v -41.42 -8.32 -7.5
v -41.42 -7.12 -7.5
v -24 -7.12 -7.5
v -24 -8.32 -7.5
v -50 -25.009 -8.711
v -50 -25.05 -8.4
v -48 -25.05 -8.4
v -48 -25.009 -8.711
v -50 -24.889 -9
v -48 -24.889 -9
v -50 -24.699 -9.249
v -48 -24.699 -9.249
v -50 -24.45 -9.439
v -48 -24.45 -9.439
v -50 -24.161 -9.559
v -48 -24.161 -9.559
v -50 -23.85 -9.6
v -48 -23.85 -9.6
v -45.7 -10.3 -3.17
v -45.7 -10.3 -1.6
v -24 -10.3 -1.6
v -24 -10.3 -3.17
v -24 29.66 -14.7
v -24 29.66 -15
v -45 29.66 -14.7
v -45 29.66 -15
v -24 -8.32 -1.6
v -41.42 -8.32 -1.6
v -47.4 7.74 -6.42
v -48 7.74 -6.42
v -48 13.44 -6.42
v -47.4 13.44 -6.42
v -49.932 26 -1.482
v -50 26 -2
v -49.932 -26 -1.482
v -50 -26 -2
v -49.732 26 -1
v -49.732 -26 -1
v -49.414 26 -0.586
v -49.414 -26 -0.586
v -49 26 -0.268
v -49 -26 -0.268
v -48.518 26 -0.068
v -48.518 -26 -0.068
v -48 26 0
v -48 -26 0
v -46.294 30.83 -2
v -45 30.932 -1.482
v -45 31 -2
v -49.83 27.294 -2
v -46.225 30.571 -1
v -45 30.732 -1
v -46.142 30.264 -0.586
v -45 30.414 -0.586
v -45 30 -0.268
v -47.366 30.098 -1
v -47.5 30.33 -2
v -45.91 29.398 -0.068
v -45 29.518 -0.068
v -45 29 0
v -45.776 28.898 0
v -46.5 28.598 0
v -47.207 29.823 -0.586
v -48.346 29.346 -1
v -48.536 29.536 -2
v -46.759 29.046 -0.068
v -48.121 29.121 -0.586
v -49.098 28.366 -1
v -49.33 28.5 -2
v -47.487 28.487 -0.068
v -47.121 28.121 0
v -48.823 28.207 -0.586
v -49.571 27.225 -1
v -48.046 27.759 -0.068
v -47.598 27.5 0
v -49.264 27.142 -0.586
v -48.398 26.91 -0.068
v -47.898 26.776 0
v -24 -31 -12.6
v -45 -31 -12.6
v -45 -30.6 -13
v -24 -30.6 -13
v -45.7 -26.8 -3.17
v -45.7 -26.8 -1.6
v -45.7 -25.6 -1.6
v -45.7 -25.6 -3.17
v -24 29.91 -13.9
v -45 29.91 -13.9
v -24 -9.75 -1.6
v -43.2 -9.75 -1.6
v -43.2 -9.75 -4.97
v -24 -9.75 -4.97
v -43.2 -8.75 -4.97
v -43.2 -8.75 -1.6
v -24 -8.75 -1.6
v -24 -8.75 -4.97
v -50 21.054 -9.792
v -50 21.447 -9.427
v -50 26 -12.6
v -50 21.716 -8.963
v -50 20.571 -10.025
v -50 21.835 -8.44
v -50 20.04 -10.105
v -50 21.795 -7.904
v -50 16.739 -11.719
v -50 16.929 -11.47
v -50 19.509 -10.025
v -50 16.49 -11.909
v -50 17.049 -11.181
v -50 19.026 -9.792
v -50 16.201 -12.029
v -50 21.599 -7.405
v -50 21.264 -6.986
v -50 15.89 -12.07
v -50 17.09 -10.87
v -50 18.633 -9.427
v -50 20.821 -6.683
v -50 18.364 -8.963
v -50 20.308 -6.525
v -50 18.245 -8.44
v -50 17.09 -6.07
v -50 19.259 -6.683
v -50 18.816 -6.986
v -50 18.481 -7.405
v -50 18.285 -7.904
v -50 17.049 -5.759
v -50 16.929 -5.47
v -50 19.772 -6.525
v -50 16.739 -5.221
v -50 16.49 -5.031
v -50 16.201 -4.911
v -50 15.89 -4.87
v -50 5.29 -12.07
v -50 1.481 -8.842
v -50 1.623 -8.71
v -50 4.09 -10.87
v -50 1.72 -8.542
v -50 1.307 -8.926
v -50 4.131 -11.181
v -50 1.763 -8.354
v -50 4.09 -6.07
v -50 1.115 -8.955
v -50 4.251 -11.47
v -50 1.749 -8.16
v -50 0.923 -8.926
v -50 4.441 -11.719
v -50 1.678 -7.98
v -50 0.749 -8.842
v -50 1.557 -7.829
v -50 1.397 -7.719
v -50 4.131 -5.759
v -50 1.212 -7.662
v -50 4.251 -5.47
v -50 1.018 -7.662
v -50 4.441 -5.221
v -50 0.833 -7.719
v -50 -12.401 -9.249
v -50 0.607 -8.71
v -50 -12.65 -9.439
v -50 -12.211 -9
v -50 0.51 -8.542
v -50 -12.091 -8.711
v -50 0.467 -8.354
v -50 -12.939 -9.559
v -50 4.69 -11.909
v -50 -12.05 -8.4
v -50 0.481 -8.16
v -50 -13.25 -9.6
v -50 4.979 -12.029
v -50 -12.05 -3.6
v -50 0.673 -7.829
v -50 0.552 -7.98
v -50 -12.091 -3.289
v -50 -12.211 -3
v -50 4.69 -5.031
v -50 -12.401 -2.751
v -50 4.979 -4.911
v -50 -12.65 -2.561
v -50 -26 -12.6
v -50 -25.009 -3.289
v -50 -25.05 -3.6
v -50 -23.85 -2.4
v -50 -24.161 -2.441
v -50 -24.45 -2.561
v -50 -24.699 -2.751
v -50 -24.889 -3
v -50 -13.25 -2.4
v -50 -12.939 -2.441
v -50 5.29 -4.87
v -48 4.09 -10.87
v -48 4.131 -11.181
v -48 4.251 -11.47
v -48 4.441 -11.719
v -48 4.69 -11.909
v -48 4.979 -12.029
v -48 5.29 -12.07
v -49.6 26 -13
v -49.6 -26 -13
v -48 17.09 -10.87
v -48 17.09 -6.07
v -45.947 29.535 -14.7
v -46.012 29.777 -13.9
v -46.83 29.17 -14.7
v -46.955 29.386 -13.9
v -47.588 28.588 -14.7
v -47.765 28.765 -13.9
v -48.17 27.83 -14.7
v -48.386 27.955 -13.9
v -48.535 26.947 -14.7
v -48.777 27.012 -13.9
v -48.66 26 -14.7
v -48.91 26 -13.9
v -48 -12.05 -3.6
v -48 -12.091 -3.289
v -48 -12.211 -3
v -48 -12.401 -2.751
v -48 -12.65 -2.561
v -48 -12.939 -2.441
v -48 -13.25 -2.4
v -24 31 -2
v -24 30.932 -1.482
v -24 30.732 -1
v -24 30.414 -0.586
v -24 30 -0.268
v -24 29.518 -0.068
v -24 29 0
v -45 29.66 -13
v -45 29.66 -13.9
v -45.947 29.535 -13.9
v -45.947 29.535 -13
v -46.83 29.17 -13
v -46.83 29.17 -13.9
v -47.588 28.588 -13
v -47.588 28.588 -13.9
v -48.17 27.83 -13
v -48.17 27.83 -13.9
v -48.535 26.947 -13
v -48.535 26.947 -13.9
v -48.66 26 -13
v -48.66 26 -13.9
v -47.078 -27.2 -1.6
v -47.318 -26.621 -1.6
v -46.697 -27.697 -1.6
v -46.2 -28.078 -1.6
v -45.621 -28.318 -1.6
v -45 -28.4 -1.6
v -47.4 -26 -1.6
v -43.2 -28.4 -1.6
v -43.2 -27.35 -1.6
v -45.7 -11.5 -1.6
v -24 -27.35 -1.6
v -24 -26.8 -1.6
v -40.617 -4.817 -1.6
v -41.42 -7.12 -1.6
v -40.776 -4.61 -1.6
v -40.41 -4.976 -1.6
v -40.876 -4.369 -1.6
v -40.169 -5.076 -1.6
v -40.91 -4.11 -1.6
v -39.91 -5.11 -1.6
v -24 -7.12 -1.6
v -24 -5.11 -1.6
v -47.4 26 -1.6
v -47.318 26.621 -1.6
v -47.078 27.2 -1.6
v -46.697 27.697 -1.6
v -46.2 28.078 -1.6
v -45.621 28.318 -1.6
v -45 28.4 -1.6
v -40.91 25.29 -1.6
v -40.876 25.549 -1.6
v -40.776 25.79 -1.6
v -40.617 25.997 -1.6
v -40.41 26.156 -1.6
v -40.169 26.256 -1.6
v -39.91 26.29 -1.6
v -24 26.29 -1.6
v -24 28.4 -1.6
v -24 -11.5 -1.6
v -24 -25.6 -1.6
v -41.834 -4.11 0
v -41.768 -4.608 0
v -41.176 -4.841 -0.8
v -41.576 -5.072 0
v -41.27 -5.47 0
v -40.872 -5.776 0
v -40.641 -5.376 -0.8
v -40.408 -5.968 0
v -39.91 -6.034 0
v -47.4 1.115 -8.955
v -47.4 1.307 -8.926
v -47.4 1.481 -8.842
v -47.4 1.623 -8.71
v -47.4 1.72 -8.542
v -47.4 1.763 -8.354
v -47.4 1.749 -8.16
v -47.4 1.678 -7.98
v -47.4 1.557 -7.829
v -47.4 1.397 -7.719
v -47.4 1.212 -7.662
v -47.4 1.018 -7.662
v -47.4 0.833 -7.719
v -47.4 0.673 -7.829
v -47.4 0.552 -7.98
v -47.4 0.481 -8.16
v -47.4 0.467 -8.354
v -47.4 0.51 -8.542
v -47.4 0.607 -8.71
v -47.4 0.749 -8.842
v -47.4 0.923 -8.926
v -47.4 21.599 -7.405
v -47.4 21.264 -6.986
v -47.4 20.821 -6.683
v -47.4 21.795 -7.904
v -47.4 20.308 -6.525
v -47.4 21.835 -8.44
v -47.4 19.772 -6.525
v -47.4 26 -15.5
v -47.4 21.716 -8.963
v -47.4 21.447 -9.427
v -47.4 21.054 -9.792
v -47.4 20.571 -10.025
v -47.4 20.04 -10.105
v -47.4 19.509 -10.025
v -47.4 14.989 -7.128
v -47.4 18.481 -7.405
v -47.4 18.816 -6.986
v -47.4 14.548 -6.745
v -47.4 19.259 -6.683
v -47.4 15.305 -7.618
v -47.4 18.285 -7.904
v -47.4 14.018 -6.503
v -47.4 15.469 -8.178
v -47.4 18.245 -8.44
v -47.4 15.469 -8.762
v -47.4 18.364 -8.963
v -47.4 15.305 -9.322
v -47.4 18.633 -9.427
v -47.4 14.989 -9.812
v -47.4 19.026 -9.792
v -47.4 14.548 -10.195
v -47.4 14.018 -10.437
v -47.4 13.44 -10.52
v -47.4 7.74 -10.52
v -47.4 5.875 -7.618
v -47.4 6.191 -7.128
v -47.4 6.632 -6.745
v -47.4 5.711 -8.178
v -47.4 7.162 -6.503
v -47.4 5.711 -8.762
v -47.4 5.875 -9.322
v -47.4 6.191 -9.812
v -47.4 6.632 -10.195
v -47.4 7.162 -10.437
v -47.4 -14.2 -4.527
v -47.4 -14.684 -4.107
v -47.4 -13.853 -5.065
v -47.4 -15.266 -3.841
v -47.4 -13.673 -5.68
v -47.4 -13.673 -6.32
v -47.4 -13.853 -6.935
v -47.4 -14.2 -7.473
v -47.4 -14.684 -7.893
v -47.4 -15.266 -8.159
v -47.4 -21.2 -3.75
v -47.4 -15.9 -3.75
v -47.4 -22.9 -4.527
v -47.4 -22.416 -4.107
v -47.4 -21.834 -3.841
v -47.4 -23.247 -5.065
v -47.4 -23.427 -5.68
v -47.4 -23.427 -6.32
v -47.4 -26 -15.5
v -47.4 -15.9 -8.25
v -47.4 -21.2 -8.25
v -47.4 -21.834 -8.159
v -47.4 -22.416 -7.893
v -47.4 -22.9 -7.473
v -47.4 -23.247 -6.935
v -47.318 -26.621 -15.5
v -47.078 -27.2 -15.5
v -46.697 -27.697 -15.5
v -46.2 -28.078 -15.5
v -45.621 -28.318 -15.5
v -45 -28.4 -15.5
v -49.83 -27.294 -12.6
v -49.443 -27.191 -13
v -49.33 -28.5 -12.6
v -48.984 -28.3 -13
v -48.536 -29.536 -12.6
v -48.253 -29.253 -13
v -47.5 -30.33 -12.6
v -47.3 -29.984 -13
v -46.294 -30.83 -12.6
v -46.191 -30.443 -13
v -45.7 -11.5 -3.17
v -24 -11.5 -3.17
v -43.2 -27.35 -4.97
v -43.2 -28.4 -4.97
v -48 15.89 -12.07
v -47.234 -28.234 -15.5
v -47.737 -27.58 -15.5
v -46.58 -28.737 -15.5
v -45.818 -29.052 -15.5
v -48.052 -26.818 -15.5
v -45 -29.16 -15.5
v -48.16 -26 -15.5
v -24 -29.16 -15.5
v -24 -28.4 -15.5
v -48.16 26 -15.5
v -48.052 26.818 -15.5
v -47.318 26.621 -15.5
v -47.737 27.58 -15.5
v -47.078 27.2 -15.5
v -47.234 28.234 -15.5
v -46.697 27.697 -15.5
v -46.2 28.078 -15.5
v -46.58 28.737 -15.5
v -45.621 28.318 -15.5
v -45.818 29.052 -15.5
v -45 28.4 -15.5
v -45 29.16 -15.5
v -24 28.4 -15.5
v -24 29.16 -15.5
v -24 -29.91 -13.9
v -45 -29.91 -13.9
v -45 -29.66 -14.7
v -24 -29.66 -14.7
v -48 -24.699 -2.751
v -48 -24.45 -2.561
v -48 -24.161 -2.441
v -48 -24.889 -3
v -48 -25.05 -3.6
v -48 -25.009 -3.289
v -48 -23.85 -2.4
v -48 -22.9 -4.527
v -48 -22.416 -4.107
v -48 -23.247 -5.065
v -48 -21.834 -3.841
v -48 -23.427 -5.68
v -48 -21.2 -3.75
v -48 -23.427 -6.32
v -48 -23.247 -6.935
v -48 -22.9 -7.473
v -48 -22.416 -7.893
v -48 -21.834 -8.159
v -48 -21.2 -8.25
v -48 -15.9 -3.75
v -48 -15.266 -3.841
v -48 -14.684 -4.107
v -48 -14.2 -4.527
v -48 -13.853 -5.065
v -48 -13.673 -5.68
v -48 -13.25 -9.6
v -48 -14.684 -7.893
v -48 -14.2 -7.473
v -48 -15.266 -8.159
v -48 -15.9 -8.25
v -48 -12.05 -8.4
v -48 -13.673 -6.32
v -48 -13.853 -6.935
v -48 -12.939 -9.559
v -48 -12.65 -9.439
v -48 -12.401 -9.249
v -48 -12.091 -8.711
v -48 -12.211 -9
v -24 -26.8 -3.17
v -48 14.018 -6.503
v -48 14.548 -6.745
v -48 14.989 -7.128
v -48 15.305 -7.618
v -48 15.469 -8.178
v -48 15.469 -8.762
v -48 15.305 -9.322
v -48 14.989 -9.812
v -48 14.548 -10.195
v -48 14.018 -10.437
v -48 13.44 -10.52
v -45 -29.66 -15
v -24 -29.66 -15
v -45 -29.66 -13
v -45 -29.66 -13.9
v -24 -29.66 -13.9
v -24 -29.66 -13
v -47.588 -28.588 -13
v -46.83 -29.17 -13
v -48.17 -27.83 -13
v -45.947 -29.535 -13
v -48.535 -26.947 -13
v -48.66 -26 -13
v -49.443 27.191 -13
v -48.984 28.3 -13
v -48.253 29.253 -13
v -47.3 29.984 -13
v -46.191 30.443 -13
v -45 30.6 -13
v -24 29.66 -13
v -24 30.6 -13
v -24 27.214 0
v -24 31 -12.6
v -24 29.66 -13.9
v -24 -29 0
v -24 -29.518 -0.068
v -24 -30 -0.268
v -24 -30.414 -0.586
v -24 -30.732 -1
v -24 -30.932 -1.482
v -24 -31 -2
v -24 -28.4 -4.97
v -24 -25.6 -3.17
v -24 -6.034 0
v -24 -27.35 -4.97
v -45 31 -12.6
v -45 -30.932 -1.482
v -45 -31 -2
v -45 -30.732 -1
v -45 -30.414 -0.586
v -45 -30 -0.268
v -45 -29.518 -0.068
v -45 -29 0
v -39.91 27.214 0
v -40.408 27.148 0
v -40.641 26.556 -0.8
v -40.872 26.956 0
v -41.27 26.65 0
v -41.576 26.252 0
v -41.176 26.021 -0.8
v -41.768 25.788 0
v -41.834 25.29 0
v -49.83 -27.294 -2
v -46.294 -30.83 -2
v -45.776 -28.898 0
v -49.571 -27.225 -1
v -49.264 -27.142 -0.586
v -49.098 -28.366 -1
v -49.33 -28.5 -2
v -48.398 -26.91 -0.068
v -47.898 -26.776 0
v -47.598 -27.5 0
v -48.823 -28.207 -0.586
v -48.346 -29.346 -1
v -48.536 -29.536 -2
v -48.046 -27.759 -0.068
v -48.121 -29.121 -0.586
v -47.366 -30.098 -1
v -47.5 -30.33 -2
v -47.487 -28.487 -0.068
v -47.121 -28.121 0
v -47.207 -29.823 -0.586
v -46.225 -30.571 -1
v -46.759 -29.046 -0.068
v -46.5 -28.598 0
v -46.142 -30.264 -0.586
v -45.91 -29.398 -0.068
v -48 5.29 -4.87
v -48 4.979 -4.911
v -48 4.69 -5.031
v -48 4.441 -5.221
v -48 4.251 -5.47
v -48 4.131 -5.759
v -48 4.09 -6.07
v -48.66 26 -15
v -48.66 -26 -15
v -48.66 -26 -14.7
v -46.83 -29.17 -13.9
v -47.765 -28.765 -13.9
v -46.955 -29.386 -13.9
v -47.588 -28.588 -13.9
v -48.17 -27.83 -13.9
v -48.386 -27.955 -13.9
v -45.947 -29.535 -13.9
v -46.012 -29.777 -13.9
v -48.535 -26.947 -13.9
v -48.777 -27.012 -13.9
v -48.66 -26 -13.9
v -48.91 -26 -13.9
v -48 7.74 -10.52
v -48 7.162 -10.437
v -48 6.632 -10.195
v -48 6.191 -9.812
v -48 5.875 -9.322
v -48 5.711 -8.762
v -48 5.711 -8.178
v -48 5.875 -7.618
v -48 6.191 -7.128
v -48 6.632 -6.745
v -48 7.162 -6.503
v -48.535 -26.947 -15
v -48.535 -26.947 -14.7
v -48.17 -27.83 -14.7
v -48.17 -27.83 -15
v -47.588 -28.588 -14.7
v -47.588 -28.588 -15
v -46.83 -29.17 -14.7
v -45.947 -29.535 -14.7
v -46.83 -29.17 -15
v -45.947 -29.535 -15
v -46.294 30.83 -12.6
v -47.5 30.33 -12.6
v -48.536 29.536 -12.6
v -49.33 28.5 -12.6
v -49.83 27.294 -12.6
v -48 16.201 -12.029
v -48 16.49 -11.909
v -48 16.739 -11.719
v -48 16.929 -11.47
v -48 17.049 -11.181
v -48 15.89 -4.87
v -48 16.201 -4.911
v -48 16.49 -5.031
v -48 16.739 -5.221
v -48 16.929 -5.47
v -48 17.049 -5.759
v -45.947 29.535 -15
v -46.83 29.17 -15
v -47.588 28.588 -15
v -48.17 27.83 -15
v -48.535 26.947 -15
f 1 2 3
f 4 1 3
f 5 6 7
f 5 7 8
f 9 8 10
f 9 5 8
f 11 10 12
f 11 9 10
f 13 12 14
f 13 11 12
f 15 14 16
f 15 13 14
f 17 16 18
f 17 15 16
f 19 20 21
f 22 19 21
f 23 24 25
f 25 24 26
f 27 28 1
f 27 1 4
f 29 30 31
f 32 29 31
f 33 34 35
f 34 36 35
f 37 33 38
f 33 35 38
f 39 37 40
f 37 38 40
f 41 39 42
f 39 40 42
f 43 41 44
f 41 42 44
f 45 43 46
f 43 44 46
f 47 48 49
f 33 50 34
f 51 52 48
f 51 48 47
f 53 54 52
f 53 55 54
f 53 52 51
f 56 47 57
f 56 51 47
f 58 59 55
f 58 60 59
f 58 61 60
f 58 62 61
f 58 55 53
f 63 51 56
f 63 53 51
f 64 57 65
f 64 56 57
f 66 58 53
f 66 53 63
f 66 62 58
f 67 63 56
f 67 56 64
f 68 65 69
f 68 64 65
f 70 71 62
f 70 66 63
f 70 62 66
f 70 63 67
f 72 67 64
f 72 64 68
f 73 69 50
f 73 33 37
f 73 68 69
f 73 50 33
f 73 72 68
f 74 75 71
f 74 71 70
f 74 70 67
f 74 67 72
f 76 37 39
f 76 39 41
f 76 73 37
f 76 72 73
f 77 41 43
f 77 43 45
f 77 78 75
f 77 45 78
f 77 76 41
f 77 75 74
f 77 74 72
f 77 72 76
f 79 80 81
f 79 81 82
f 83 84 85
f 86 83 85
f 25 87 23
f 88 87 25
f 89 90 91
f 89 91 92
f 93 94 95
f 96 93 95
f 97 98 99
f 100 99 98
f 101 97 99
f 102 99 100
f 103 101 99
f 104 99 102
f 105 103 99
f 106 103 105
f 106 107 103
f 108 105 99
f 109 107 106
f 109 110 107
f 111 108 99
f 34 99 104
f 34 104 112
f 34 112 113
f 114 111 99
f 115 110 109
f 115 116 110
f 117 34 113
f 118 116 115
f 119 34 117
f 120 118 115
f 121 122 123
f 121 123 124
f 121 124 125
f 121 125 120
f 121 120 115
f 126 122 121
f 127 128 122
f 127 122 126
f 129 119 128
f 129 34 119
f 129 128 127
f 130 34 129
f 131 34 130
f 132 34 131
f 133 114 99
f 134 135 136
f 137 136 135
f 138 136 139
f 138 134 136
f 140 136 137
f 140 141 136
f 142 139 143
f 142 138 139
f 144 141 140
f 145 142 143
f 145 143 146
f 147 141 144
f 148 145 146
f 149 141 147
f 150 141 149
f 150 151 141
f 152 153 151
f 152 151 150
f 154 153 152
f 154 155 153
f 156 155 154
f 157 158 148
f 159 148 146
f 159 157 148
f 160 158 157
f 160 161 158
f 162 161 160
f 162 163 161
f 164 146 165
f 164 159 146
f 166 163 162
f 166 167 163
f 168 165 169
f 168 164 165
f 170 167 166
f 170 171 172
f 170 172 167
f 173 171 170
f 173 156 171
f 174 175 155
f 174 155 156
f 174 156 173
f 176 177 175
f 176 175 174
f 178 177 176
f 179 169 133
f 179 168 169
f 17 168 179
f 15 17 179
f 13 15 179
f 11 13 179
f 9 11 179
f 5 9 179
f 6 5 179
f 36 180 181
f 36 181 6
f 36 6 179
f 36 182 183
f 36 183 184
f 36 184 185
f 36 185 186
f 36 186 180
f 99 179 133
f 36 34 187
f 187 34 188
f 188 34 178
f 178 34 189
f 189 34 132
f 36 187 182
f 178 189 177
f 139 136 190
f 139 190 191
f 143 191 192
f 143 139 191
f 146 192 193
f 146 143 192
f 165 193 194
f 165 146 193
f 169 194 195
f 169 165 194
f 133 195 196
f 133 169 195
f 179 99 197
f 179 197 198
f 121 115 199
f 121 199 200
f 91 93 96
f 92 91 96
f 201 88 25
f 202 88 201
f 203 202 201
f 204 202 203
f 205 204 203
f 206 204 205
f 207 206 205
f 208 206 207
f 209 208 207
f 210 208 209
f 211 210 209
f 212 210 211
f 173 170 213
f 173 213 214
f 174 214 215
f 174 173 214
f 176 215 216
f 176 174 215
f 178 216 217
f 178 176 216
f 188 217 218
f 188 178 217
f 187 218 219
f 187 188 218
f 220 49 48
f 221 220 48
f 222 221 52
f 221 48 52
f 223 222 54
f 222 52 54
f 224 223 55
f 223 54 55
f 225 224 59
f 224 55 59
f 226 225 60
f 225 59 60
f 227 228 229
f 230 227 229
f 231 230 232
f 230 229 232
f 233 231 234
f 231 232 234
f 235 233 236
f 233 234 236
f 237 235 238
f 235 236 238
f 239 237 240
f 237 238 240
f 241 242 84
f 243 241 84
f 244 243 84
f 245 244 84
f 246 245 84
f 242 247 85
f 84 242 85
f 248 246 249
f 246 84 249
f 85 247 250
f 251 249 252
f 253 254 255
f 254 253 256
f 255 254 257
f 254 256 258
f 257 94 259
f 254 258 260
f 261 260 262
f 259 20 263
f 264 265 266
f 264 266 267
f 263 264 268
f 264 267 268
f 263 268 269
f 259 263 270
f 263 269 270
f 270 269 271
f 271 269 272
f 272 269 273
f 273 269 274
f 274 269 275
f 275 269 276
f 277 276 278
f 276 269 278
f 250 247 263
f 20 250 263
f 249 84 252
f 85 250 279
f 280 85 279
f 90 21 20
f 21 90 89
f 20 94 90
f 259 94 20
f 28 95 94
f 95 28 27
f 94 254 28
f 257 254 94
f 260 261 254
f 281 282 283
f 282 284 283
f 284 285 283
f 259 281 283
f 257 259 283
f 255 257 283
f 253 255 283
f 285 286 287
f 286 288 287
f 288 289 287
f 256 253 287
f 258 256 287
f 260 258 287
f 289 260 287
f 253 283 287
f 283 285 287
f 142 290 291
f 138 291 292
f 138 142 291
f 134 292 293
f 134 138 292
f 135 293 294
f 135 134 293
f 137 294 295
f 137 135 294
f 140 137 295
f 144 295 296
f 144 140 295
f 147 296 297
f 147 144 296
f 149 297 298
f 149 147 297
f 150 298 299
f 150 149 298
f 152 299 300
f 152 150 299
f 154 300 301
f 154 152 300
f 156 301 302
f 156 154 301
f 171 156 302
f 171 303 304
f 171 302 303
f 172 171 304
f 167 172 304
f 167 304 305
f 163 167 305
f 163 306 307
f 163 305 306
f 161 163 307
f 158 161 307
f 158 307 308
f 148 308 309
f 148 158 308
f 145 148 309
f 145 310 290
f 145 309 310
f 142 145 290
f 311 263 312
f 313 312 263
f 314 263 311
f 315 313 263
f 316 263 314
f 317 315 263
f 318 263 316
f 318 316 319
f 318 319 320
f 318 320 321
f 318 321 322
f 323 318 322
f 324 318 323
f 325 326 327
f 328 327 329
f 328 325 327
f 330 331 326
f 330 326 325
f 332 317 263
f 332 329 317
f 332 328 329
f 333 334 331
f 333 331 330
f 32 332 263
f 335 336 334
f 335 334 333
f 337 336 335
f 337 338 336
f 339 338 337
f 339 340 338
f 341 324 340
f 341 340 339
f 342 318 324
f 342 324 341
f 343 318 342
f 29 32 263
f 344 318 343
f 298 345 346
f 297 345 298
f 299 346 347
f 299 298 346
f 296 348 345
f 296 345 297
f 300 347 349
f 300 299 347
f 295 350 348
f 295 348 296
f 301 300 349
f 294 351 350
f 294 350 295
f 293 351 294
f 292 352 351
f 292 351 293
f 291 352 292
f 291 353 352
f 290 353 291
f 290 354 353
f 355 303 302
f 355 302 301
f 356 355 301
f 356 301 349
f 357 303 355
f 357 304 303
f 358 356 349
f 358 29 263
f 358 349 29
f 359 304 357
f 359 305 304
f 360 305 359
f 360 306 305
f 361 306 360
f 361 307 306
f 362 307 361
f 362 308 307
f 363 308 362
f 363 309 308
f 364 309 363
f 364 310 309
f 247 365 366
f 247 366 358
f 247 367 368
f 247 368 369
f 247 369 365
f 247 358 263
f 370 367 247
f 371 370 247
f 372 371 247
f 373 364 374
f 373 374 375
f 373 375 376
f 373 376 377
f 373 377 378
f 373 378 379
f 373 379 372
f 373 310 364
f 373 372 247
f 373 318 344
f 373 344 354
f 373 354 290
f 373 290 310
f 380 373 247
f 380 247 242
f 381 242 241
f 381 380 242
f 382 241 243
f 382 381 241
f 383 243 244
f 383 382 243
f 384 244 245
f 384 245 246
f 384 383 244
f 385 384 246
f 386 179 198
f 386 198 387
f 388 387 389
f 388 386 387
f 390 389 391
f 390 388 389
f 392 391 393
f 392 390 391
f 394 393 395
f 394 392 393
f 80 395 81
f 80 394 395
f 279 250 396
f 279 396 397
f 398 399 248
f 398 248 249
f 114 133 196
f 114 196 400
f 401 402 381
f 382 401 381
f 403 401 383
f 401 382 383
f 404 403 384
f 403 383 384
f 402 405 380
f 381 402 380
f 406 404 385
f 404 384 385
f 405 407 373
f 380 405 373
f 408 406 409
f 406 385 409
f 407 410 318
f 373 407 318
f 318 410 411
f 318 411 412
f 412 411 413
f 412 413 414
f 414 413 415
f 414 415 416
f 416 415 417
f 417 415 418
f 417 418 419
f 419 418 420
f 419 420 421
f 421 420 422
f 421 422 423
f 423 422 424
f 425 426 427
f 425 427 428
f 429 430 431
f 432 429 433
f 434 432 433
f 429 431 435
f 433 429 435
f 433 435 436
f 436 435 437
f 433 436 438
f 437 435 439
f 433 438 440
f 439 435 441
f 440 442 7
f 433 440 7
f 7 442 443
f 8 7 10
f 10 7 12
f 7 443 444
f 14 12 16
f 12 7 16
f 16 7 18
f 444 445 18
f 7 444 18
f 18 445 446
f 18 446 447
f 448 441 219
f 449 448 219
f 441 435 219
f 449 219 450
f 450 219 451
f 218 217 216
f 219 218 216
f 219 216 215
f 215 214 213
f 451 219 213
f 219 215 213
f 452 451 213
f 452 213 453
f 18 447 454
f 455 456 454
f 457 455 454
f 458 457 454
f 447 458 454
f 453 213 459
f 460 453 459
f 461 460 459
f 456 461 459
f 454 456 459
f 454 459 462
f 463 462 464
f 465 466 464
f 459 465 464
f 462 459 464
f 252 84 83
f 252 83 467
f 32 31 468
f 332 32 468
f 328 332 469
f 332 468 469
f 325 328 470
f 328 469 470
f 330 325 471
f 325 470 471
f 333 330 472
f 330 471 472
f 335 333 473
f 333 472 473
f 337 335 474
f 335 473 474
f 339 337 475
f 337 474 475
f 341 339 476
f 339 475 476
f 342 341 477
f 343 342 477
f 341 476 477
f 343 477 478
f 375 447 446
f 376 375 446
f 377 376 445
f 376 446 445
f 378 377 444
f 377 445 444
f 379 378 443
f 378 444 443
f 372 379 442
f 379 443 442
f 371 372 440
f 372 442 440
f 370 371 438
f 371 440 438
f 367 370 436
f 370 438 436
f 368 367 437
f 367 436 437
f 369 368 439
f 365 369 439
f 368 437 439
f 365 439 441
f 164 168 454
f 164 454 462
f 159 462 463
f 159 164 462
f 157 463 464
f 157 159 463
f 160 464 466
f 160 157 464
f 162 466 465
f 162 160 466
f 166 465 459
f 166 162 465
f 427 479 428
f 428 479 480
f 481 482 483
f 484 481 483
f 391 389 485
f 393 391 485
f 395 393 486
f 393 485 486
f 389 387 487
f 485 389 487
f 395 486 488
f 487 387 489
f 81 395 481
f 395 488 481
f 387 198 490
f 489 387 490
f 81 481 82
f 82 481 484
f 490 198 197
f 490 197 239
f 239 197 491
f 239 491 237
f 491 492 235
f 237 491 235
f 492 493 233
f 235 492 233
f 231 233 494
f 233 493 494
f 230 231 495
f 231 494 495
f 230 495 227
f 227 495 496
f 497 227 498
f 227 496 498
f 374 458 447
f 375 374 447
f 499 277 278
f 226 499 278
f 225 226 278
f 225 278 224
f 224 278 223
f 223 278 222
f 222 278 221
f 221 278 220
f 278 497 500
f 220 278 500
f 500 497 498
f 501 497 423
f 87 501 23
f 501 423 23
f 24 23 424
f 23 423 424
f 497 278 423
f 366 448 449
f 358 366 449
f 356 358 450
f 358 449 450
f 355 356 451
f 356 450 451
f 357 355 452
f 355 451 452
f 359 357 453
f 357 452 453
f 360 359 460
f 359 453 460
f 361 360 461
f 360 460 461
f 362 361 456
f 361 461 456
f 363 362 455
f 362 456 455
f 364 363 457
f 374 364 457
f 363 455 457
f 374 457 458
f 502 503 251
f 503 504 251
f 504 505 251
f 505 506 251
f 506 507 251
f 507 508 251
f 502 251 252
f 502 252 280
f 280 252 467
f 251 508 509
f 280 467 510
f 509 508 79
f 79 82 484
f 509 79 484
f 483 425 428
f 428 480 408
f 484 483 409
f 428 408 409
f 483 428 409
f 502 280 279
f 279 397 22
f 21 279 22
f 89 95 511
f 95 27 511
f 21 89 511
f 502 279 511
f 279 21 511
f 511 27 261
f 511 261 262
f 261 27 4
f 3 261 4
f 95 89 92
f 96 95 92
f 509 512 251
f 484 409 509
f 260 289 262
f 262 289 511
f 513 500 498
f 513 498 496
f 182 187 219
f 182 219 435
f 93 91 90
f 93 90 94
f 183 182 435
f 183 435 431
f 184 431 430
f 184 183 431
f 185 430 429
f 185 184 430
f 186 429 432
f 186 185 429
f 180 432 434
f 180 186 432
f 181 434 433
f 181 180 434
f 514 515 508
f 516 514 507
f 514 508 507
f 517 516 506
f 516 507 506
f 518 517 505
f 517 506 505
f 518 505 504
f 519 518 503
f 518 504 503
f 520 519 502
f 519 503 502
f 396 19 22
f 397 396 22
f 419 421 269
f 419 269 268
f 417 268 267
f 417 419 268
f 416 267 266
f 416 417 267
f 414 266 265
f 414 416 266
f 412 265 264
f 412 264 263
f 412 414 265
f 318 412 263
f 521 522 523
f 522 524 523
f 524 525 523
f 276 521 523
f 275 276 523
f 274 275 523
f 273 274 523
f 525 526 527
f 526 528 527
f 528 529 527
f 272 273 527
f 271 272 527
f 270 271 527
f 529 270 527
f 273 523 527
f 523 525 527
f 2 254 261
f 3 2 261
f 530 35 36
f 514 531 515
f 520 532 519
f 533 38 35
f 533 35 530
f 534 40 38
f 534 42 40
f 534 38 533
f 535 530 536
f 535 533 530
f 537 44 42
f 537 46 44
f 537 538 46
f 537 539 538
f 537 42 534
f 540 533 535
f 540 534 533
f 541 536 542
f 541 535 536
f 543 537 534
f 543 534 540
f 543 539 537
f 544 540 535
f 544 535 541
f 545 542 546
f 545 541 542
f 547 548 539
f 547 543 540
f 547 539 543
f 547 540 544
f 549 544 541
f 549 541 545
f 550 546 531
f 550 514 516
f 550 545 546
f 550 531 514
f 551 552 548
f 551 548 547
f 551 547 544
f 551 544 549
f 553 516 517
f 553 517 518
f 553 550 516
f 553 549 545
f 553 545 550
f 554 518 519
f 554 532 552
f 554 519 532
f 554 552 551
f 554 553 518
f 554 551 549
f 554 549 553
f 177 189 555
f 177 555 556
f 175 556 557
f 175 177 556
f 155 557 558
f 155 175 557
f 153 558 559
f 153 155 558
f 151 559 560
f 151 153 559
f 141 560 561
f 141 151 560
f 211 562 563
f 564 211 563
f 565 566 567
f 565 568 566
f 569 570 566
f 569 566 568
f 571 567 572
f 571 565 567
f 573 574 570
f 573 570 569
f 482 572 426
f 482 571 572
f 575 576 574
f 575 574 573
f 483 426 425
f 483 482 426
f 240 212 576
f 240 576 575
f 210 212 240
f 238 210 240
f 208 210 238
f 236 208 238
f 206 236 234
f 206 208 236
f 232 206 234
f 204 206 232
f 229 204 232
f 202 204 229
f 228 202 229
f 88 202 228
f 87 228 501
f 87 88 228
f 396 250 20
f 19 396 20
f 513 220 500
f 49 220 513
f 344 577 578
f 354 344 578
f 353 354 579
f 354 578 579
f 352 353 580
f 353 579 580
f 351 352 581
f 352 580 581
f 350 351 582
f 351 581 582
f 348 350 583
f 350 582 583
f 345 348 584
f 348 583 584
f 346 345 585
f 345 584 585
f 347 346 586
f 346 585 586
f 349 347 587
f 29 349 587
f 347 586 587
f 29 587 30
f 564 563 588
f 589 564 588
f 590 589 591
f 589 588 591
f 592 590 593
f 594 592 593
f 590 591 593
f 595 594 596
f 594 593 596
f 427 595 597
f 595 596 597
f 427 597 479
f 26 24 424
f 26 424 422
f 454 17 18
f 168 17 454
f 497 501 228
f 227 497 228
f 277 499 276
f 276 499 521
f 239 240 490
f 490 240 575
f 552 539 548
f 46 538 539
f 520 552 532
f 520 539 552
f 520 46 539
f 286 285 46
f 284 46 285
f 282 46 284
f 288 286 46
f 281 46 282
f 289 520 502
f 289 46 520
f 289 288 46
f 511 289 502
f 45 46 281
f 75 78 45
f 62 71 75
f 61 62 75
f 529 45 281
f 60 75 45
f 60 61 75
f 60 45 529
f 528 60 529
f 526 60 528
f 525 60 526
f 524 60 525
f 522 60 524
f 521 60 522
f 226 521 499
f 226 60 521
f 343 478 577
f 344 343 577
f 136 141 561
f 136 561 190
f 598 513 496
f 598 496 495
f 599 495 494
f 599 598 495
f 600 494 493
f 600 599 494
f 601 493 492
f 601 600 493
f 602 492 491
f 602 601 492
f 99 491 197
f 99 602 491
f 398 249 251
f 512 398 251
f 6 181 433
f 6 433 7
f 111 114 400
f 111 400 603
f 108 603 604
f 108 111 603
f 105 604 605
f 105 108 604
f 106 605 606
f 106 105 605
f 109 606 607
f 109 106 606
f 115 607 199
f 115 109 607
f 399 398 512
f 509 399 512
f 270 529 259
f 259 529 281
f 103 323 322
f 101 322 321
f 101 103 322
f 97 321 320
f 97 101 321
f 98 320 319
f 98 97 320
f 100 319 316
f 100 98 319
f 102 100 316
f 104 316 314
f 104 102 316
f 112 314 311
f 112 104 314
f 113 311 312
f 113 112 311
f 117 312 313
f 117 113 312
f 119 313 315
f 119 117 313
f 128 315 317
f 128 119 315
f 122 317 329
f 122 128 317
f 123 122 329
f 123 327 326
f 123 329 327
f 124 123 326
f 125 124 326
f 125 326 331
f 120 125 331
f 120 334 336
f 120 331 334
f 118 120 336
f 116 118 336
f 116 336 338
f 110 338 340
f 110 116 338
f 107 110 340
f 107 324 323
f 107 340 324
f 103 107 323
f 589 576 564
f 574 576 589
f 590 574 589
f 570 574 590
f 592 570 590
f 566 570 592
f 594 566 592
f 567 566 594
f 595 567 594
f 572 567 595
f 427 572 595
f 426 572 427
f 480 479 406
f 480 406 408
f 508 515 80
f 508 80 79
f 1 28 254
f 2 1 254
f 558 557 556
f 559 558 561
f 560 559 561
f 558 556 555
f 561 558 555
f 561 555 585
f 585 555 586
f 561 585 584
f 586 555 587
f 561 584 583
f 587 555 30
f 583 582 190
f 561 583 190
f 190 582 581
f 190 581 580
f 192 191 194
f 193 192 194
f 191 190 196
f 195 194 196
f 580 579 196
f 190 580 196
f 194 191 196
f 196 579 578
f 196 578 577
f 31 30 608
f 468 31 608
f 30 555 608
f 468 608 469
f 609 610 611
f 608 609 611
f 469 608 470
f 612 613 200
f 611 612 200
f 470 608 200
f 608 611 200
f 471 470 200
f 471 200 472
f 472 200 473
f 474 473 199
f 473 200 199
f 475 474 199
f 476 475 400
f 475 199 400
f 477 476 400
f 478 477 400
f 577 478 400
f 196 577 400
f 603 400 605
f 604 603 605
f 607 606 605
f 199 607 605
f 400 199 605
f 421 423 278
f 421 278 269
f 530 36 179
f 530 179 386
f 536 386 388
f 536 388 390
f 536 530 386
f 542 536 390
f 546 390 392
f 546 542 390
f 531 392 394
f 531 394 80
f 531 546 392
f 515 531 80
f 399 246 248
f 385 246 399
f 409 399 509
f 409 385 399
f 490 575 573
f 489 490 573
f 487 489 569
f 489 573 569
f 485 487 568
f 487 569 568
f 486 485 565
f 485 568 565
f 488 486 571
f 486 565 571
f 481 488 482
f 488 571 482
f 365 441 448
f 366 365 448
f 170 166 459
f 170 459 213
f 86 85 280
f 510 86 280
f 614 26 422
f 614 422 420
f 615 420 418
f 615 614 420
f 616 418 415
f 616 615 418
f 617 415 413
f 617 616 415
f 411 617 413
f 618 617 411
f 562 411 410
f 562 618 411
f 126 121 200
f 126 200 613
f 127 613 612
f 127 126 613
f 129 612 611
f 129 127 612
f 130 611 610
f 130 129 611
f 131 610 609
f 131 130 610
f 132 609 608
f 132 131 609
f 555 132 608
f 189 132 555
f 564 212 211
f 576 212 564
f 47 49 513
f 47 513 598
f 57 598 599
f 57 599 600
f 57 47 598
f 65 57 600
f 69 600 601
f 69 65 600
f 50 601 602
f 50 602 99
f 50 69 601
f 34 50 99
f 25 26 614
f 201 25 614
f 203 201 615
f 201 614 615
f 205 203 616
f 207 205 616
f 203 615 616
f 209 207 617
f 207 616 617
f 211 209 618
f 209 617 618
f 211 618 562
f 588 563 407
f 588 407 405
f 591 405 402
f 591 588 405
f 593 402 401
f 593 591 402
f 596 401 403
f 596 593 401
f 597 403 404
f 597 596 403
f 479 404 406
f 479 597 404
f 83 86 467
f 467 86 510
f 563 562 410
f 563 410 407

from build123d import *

# Parameters (mm, degrees)
BODY_DEPTH              = 13
ROUND_FRONT_R           = 2
CAVITY_DEPTH            = 11.4
LIP_START               = -2.5
LIP_DEPTH               = 2.5
LIP_CHAMFER_SIZE        = 0.5
BEAD_DEPTH              = 0.8
BEAD_DRAFT              = -17.354024636
SCREEN_WINDOW_DEPTH     = 1.9
SCREEN_WINDOW_DRAFT     = -30
BOARD_FENCE_SK6_W       = 1.2
BOARD_FENCE_SK6_H       = 31.02
BOARD_FENCE_SK6_W_2     = 42.22
BOARD_FENCE_SK6_H_2     = 1.2
BOARD_FENCE_DEPTH       = 5.9
TP_RAILS_SK7_W          = 25
TP_RAILS_SK7_H          = 1.2
TP_RAILS_DEPTH          = 1.57
TP_FENCE_SK8_W          = 24
TP_FENCE_SK8_H          = 1
TP_FENCE_SK8_W_2        = 1
TP_FENCE_SK8_H_2        = 15.3
TP_FENCE_SK8_H_3        = 1.05
TP_FENCE_DEPTH          = 3.37
CELL_RIBS_SK9_W         = 1.2
CELL_RIBS_SK9_H         = 12
CELL_RIBS_DEPTH         = 9.05
MAX_RELIEF_DEPTH        = 0.9
MAX_WINDOW_DEPTH        = 1.8
MAX_WINDOW_CHAMFER_SIZE = 1
MAX_LEDGES_SK12_W       = 1.6
MAX_LEDGES_SK12_H       = 1.6
MAX_LEDGES_DEPTH        = 1.3
MAX_FENCE_DEPTH         = 2.6
USB_RECESS_DEPTH        = 2
LEFT_PORTS_SK15_R       = 1.8
LEFT_PORTS_SK15_R_2     = 0.65
LEFT_PORTS_DEPTH        = 3.2
BUZZER_KEEPER_SK16_W    = 1.2
BUZZER_KEEPER_SK16_H    = 8
BUZZER_KEEPER_DEPTH     = 14.8
MIC_KEEPER_SK17_W       = 6
MIC_KEEPER_SK17_H       = 1.2
MIC_KEEPER_DEPTH        = 13.5
SEAM_SHADOW_SIZE        = 0.4
PRY_NOTCH_SK18_W        = 8
PRY_NOTCH_SK18_H        = 1.8
PRY_NOTCH_DEPTH         = 1.2
FITTEST_TRIM_DEPTH      = 62.073398464
FITTEST_TRIM_DEPTH_BACK = 62.073398464
FITTEST_SK_W            = 120
FITTEST_SK_H            = 120


with BuildPart() as part:
    # Body_Sk1 → Body (new body)
    with BuildSketch(Plane.XY):
        with BuildLine():
            Line((-45, -31), (45, -31))
            ThreePointArc((45, -31), (48.535533906, -29.535533906), (50, -26))
            Line((50, -26), (50, 26))
            ThreePointArc((50, 26), (48.535533906, 29.535533906), (45, 31))
            Line((45, 31), (-45, 31))
            ThreePointArc((-45, 31), (-48.535533906, 29.535533906), (-50, 26))
            Line((-50, 26), (-50, -26))
            ThreePointArc((-50, -26), (-48.535533906, -29.535533906), (-45, -31))
        make_face()
    extrude(amount=-BODY_DEPTH)

    # Round_Front
    round_front_edges = [part.edges().sort_by_distance(p)[0] for p in [
        (50, 0, 0),
        (48.535533906, -29.535533906, 0),
        (0, -31, 0),
        (-48.535533906, -29.535533906, 0),
        (-50, 0, 0),
        (-48.535533906, 29.535533906, 0),
        (0, 31, 0),
        (48.535533906, 29.535533906, 0),
    ]]
    fillet(round_front_edges, radius=ROUND_FRONT_R)

    # Cavity_Sk2 → Cavity (cut)
    with BuildSketch(Plane.XY.offset(-13)):
        with BuildLine():
            Line((-45, -28.4), (45, -28.4))
            ThreePointArc((45, -28.4), (46.697056275, -27.697056275), (47.4, -26))
            Line((47.4, -26), (47.4, 26))
            ThreePointArc((47.4, 26), (46.697056275, 27.697056275), (45, 28.4))
            Line((45, 28.4), (-45, 28.4))
            ThreePointArc((-45, 28.4), (-46.697056275, 27.697056275), (-47.4, 26))
            Line((-47.4, 26), (-47.4, -26))
            ThreePointArc((-47.4, -26), (-46.697056275, -27.697056275), (-45, -28.4))
        make_face()
    extrude(amount=CAVITY_DEPTH, mode=Mode.SUBTRACT)

    # Lip_Sk3 → Lip (add)
    with BuildSketch(Plane.XY.offset(-13).offset(LIP_START)):
        with BuildLine():
            Line((-45, -29.66), (45, -29.66))
            ThreePointArc((45, -29.66), (47.588010819, -28.588010819), (48.66, -26))
            Line((48.66, -26), (48.66, 26))
            ThreePointArc((48.66, 26), (47.588010819, 28.588010819), (45, 29.66))
            Line((45, 29.66), (-45, 29.66))
            ThreePointArc((-45, 29.66), (-47.588010819, 28.588010819), (-48.66, 26))
            Line((-48.66, 26), (-48.66, -26))
            ThreePointArc((-48.66, -26), (-47.588010819, -28.588010819), (-45, -29.66))
        make_face()
        with BuildLine():
            Line((-45, -28.4), (45, -28.4))
            ThreePointArc((45, -28.4), (46.697056275, -27.697056275), (47.4, -26))
            Line((47.4, -26), (47.4, 26))
            ThreePointArc((47.4, 26), (46.697056275, 27.697056275), (45, 28.4))
            Line((45, 28.4), (-45, 28.4))
            ThreePointArc((-45, 28.4), (-46.697056275, 27.697056275), (-47.4, 26))
            Line((-47.4, 26), (-47.4, -26))
            ThreePointArc((-47.4, -26), (-46.697056275, -27.697056275), (-45, -28.4))
        make_face(mode=Mode.SUBTRACT)
    extrude(amount=LIP_DEPTH)

    # Lip_Chamfer
    lip_chamfer_edges = [part.edges().sort_by_distance(p)[0] for p in [
        (-47.588010819, -28.588010819, -15.5),
        (-48.66, 0, -15.5),
        (-47.588010819, 28.588010819, -15.5),
        (0, 29.66, -15.5),
        (47.588010819, 28.588010819, -15.5),
        (48.66, 0, -15.5),
        (47.588010819, -28.588010819, -15.5),
        (0, -29.66, -15.5),
    ]]
    chamfer(lip_chamfer_edges, length=LIP_CHAMFER_SIZE)


with BuildPart() as bead_tool:
    # Bead_Sk4 → Bead (with draft: the straight prism first)
    with BuildSketch(Plane.XY.offset(-13.9)):
        with BuildLine():
            Line((-45, -29.91), (45, -29.91))
            ThreePointArc((45, -29.91), (47.764787514, -28.764787514), (48.91, -26))
            Line((48.91, -26), (48.91, 26))
            ThreePointArc((48.91, 26), (47.764787514, 28.764787514), (45, 29.91))
            Line((45, 29.91), (-45, 29.91))
            ThreePointArc((-45, 29.91), (-47.764787514, 28.764787514), (-48.91, 26))
            Line((-48.91, 26), (-48.91, -26))
            ThreePointArc((-48.91, -26), (-47.764787514, -28.764787514), (-45, -29.91))
        make_face()
        with BuildLine():
            Line((-45, -29.06), (45, -29.06))
            ThreePointArc((45, -29.06), (47.16374675, -28.16374675), (48.06, -26))
            Line((48.06, -26), (48.06, 26))
            ThreePointArc((48.06, 26), (47.16374675, 28.16374675), (45, 29.06))
            Line((45, 29.06), (-45, 29.06))
            ThreePointArc((-45, 29.06), (-47.16374675, 28.16374675), (-48.06, 26))
            Line((-48.06, 26), (-48.06, -26))
            ThreePointArc((-48.06, -26), (-47.16374675, -28.16374675), (-45, -29.06))
        make_face(mode=Mode.SUBTRACT)
    extrude(amount=-BEAD_DEPTH)
    # Bead: the draft: its side faces are tilted about the plane it starts from
    bead_sides = [bead_tool.faces().sort_by_distance(p)[0] for p in [
        (0, -29.91, -14.3),
        (47.764787514, -28.764787514, -14.3),
        (48.91, 0, -14.3),
        (47.764787514, 28.764787514, -14.3),
        (0, 29.91, -14.3),
        (-47.764787514, 28.764787514, -14.3),
        (-48.91, 0, -14.3),
        (-47.764787514, -28.764787514, -14.3),
        (-47.16374675, -28.16374675, -14.3),
        (-48.06, 0, -14.3),
        (-47.16374675, 28.16374675, -14.3),
        (0, 29.06, -14.3),
        (47.16374675, 28.16374675, -14.3),
        (48.06, 0, -14.3),
        (47.16374675, -28.16374675, -14.3),
        (0, -29.06, -14.3),
    ]]
    draft(bead_sides, Plane.XY.offset(-13.9), BEAD_DRAFT)


with BuildPart() as part_1:
    add(part.part)

    # Bead: add bead_tool
    add(bead_tool.part)


with BuildPart() as screen_window_tool:
    # Screen_Window_Sk5 → Screen_Window (with draft: the straight prism first)
    with BuildSketch(Plane.XY):
        with BuildLine():
            Line((-39.91, -6.033760431), (-0.31, -6.033760431))
            ThreePointArc((-0.31, -6.033760431), (1.050304046, -5.470304046), (1.613760431, -4.11))
            Line((1.613760431, -4.11), (1.613760431, 25.29))
            ThreePointArc((1.613760431, 25.29), (1.050304046, 26.650304046), (-0.31, 27.213760431))
            Line((-0.31, 27.213760431), (-39.91, 27.213760431))
            ThreePointArc((-39.91, 27.213760431), (-41.270304046, 26.650304046), (-41.833760431, 25.29))
            Line((-41.833760431, 25.29), (-41.833760431, -4.11))
            ThreePointArc((-41.833760431, -4.11), (-41.270304046, -5.470304046), (-39.91, -6.033760431))
        make_face()
    extrude(amount=-SCREEN_WINDOW_DEPTH)
    # Screen_Window: the draft: its side faces are tilted about the plane it starts from
    screen_window_sides = [screen_window_tool.faces().sort_by_distance(p)[0] for p in [
        (-20.11, -6.033760431, -0.95),
        (1.050304046, -5.470304046, -0.95),
        (1.613760431, 10.59, -0.95),
        (1.050304046, 26.650304046, -0.95),
        (-20.11, 27.213760431, -0.95),
        (-41.270304046, 26.650304046, -0.95),
        (-41.833760431, 10.59, -0.95),
        (-41.270304046, -5.470304046, -0.95),
    ]]
    draft(screen_window_sides, Plane.XY, SCREEN_WINDOW_DRAFT)


with BuildPart() as part_2:
    add(part_1.part)

    # Screen_Window: cut by screen_window_tool
    add(screen_window_tool.part, mode=Mode.SUBTRACT)

    # Board_Fence_Sk6 → Board_Fence (add)
    with BuildSketch(Plane.XY.offset(-1.6)):
        with Locations((3.1, 11.59)):
            Rectangle(BOARD_FENCE_SK6_W, BOARD_FENCE_SK6_H)
        with Locations((-20.31, -7.72)):
            Rectangle(BOARD_FENCE_SK6_W_2, BOARD_FENCE_SK6_H_2)
    extrude(amount=-BOARD_FENCE_DEPTH)

    # TP_Rails_Sk7 → TP_Rails (add)
    with BuildSketch(Plane.XY.offset(-1.6)):
        with Locations((-33.2, -26.2)):
            Rectangle(TP_RAILS_SK7_W, TP_RAILS_SK7_H)
        with Locations((-33.2, -10.9)):
            Rectangle(TP_RAILS_SK7_W, TP_RAILS_SK7_H)
    extrude(amount=-TP_RAILS_DEPTH)

    # TP_Fence_Sk8 → TP_Fence (add)
    with BuildSketch(Plane.XY.offset(-1.6)):
        with Locations((-31.2, -9.25)):
            Rectangle(TP_FENCE_SK8_W, TP_FENCE_SK8_H)
        with Locations((-18.4, -18.55)):
            Rectangle(TP_FENCE_SK8_W_2, TP_FENCE_SK8_H_2)
        with Locations((-31.2, -27.875)):
            Rectangle(TP_FENCE_SK8_W, TP_FENCE_SK8_H_3)
    extrude(amount=-TP_FENCE_DEPTH)

    # Cell_Ribs_Sk9 → Cell_Ribs (add)
    with BuildSketch(Plane.XY.offset(-1.6)):
        with Locations((-10, -18.05)):
            Rectangle(CELL_RIBS_SK9_W, CELL_RIBS_SK9_H)
        with Locations((8, -18.05)):
            Rectangle(CELL_RIBS_SK9_W, CELL_RIBS_SK9_H)
        with Locations((22, -18.05)):
            Rectangle(CELL_RIBS_SK9_W, CELL_RIBS_SK9_H)
    extrude(amount=-CELL_RIBS_DEPTH)

    # MAX_Relief_Sk10 → MAX_Relief (cut)
    with BuildSketch(Plane.XY.offset(-1.6)):
        with BuildLine():
            Line((20.35, 3.85), (37.65, 3.85))
            ThreePointArc((37.65, 3.85), (38.357106781, 4.142893219), (38.65, 4.85))
            Line((38.65, 4.85), (38.65, 17.15))
            ThreePointArc((38.65, 17.15), (38.357106781, 17.857106781), (37.65, 18.15))
            Line((37.65, 18.15), (20.35, 18.15))
            ThreePointArc((20.35, 18.15), (19.642893219, 17.857106781), (19.35, 17.15))
            Line((19.35, 17.15), (19.35, 4.85))
            ThreePointArc((19.35, 4.85), (19.642893219, 4.142893219), (20.35, 3.85))
        make_face()
    extrude(amount=MAX_RELIEF_DEPTH, mode=Mode.SUBTRACT)

    # MAX_Window_Sk11 → MAX_Window (cut)
    with BuildSketch(Plane.XY):
        with BuildLine():
            Line((26, 7), (32, 7))
            ThreePointArc((32, 7), (33.414213562, 7.585786438), (34, 9))
            Line((34, 9), (34, 13))
            ThreePointArc((34, 13), (33.414213562, 14.414213562), (32, 15))
            Line((32, 15), (26, 15))
            ThreePointArc((26, 15), (24.585786438, 14.414213562), (24, 13))
            Line((24, 13), (24, 9))
            ThreePointArc((24, 9), (24.585786438, 7.585786438), (26, 7))
        make_face()
    extrude(amount=-MAX_WINDOW_DEPTH, mode=Mode.SUBTRACT)

    # MAX_Window_Chamfer
    # the kernel refuses this chamfer: 1 mm, written as the material it takes off along each edge
    with BuildSketch(Plane(origin=(26, 9, 0), x_dir=(-1, 0, 0), z_dir=(0, 1, 0))) as max_window_chamfer_piece_1:
        Polygon((2 + MAX_WINDOW_CHAMFER_SIZE, 0), (2, -MAX_WINDOW_CHAMFER_SIZE), (2, 0), align=None)
    revolve(axis=Axis((26, 9, 0), (0, 0, 1)), revolution_arc=90, mode=Mode.SUBTRACT)
    with BuildSketch(Plane(origin=(26, 7, 0), x_dir=(0, -0.9996219169112968, 0.027495876610586365), z_dir=(1, 0, 0)), Plane(origin=(32, 15, 0), x_dir=(0, 0.9996219169112968, 0.02749587661058639), z_dir=(-1, 0, 0))) as max_window_chamfer_piece_2:
        Polygon((MAX_WINDOW_CHAMFER_SIZE * 0.999621916911, MAX_WINDOW_CHAMFER_SIZE * 0.0274958766106), (-MAX_WINDOW_CHAMFER_SIZE * 0.0274958766106, MAX_WINDOW_CHAMFER_SIZE * 0.999621916911), (0, 0), align=None)
    extrude(amount=6, mode=Mode.SUBTRACT)
    with BuildSketch(Plane(origin=(32, 9, 0), x_dir=(0, -1, 0), z_dir=(-1, 0, 0))) as max_window_chamfer_piece_3:
        Polygon((2 + MAX_WINDOW_CHAMFER_SIZE, 0), (2, -MAX_WINDOW_CHAMFER_SIZE), (2, 0), align=None)
    revolve(axis=Axis((32, 9, 0), (0, 0, 1)), revolution_arc=90, mode=Mode.SUBTRACT)
    with BuildSketch(Plane(origin=(34, 9, 0), x_dir=(0.9996219169112968, 0, 0.027495876610586292), z_dir=(0, 1, 0)), Plane(origin=(24, 13, 0), x_dir=(-0.9996219169112968, 0, 0.02749587661058639), z_dir=(0, -1, 0))) as max_window_chamfer_piece_4:
        Polygon((MAX_WINDOW_CHAMFER_SIZE * 0.999621916911, MAX_WINDOW_CHAMFER_SIZE * 0.0274958766106), (-MAX_WINDOW_CHAMFER_SIZE * 0.0274958766106, MAX_WINDOW_CHAMFER_SIZE * 0.999621916911), (0, 0), align=None)
    extrude(amount=4, mode=Mode.SUBTRACT)
    with BuildSketch(Plane(origin=(32, 13, 0), x_dir=(1, 0, 0), z_dir=(0, -1, 0))) as max_window_chamfer_piece_5:
        Polygon((2 + MAX_WINDOW_CHAMFER_SIZE, 0), (2, -MAX_WINDOW_CHAMFER_SIZE), (2, 0), align=None)
    revolve(axis=Axis((32, 13, 0), (0, 0, 1)), revolution_arc=90, mode=Mode.SUBTRACT)
    with BuildSketch(Plane(origin=(26, 13, 0), x_dir=(0, 1, 0), z_dir=(1, 0, 0))) as max_window_chamfer_piece_6:
        Polygon((2 + MAX_WINDOW_CHAMFER_SIZE, 0), (2, -MAX_WINDOW_CHAMFER_SIZE), (2, 0), align=None)
    revolve(axis=Axis((26, 13, 0), (0, 0, 1)), revolution_arc=90, mode=Mode.SUBTRACT)

    # MAX_Ledges_Sk12 → MAX_Ledges (add)
    with BuildSketch(Plane.XY.offset(-0.7)):
        with Locations((19.45, 3.95)):
            Rectangle(MAX_LEDGES_SK12_W, MAX_LEDGES_SK12_H)
        with Locations((19.45, 18.05)):
            Rectangle(MAX_LEDGES_SK12_W, MAX_LEDGES_SK12_H)
        with Locations((38.55, 3.95)):
            Rectangle(MAX_LEDGES_SK12_W, MAX_LEDGES_SK12_H)
        with Locations((38.55, 18.05)):
            Rectangle(MAX_LEDGES_SK12_W, MAX_LEDGES_SK12_H)
    extrude(amount=-MAX_LEDGES_DEPTH)

    # MAX_Fence_Sk13 → MAX_Fence (add)
    with BuildSketch(Plane.XY.offset(-1.6)):
        Polygon((17.45, 20.05), (37.35, 20.05), (37.35, 18.85), (18.65, 18.85), (18.65, 3.15), (37.35, 3.15), (37.35, 1.95), (17.45, 1.95), align=None)
    extrude(amount=-MAX_FENCE_DEPTH)

    # USB_Recess_Sk14 → USB_Recess (cut)
    with BuildSketch(Plane(origin=(-50, 0, 0), x_dir=(0, 0, -1), z_dir=(1, 0, 0))):
        with BuildLine():
            Line((12.07, 5.29), (12.07, 15.89))
            ThreePointArc((12.07, 15.89), (11.718528137, 16.738528137), (10.87, 17.09))
            Line((10.87, 17.09), (6.07, 17.09))
            ThreePointArc((6.07, 17.09), (5.221471863, 16.738528137), (4.87, 15.89))
            Line((4.87, 15.89), (4.87, 5.29))
            ThreePointArc((4.87, 5.29), (5.221471863, 4.441471863), (6.07, 4.09))
            Line((6.07, 4.09), (10.87, 4.09))
            ThreePointArc((10.87, 4.09), (11.718528137, 4.441471863), (12.07, 5.29))
        make_face()
        with BuildLine():
            Line((9.6, -23.85), (9.6, -13.25))
            ThreePointArc((9.6, -13.25), (9.248528137, -12.401471863), (8.4, -12.05))
            Line((8.4, -12.05), (3.6, -12.05))
            ThreePointArc((3.6, -12.05), (2.751471863, -12.401471863), (2.4, -13.25))
            Line((2.4, -13.25), (2.4, -23.85))
            ThreePointArc((2.4, -23.85), (2.751471863, -24.698528137), (3.6, -25.05))
            Line((3.6, -25.05), (8.4, -25.05))
            ThreePointArc((8.4, -25.05), (9.248528137, -24.698528137), (9.6, -23.85))
        make_face()
    extrude(amount=USB_RECESS_DEPTH, mode=Mode.SUBTRACT)

    # Left_Ports_Sk15 → Left_Ports (cut)
    with BuildSketch(Plane(origin=(-50, 0, 0), x_dir=(0, 0, -1), z_dir=(1, 0, 0))):
        with Locations((8.305, 20.04)):
            Circle(LEFT_PORTS_SK15_R)
        with Locations((8.305, 1.115)):
            Circle(LEFT_PORTS_SK15_R_2)
        with BuildLine():
            Line((6.42, 7.74), (6.42, 13.44))
            ThreePointArc((6.42, 13.44), (8.47, 15.49), (10.52, 13.44))
            Line((10.52, 13.44), (10.52, 7.74))
            ThreePointArc((10.52, 7.74), (8.47, 5.69), (6.42, 7.74))
        make_face()
        with BuildLine():
            Line((3.75, -21.2), (3.75, -15.9))
            ThreePointArc((3.75, -15.9), (6, -13.65), (8.25, -15.9))
            Line((8.25, -15.9), (8.25, -21.2))
            ThreePointArc((8.25, -21.2), (6, -23.45), (3.75, -21.2))
        make_face()
    extrude(amount=LEFT_PORTS_DEPTH, mode=Mode.SUBTRACT)

    # Buzzer_Keeper_Sk16 → Buzzer_Keeper (add)
    with BuildSketch(Plane.XY.offset(-1.6)):
        with Locations((44.9, -18)):
            Rectangle(BUZZER_KEEPER_SK16_W, BUZZER_KEEPER_SK16_H)
    extrude(amount=-BUZZER_KEEPER_DEPTH)

    # Mic_Keeper_Sk17 → Mic_Keeper (add)
    with BuildSketch(Plane.XY.offset(-1.6)):
        with Locations((16, 27.8)):
            Rectangle(MIC_KEEPER_SK17_W, MIC_KEEPER_SK17_H)
    extrude(amount=-MIC_KEEPER_DEPTH)

    # Seam_Shadow
    seam_shadow_edges = [part_2.edges().sort_by_distance(p)[0] for p in [
        (48.535533906, -29.535533906, -13),
        (50, 0, -13),
        (48.535533906, 29.535533906, -13),
        (0, 31, -13),
        (-48.535533906, 29.535533906, -13),
        (-50, 0, -13),
        (-48.535533906, -29.535533906, -13),
        (0, -31, -13),
    ]]
    chamfer(seam_shadow_edges, length=SEAM_SHADOW_SIZE)

    # Pry_Notch_Sk18 → Pry_Notch (cut)
    with BuildSketch(Plane(origin=(0, -31, 0), x_dir=(1, 0, 0), z_dir=(0, 1, 0))):
        with Locations((38, 12.1)):
            Rectangle(PRY_NOTCH_SK18_W, PRY_NOTCH_SK18_H)
    extrude(amount=PRY_NOTCH_DEPTH, mode=Mode.SUBTRACT)

    # FitTest_Sk → FitTest_Trim (cut, two sides: drawn at the far end of the back side and taken through both)
    with BuildSketch(Plane.XY.offset(-FITTEST_TRIM_DEPTH_BACK)):
        with Locations((36, 0)):
            Rectangle(FITTEST_SK_W, FITTEST_SK_H)
    extrude(amount=FITTEST_TRIM_DEPTH + FITTEST_TRIM_DEPTH_BACK, mode=Mode.SUBTRACT)


solid = part_2.part
